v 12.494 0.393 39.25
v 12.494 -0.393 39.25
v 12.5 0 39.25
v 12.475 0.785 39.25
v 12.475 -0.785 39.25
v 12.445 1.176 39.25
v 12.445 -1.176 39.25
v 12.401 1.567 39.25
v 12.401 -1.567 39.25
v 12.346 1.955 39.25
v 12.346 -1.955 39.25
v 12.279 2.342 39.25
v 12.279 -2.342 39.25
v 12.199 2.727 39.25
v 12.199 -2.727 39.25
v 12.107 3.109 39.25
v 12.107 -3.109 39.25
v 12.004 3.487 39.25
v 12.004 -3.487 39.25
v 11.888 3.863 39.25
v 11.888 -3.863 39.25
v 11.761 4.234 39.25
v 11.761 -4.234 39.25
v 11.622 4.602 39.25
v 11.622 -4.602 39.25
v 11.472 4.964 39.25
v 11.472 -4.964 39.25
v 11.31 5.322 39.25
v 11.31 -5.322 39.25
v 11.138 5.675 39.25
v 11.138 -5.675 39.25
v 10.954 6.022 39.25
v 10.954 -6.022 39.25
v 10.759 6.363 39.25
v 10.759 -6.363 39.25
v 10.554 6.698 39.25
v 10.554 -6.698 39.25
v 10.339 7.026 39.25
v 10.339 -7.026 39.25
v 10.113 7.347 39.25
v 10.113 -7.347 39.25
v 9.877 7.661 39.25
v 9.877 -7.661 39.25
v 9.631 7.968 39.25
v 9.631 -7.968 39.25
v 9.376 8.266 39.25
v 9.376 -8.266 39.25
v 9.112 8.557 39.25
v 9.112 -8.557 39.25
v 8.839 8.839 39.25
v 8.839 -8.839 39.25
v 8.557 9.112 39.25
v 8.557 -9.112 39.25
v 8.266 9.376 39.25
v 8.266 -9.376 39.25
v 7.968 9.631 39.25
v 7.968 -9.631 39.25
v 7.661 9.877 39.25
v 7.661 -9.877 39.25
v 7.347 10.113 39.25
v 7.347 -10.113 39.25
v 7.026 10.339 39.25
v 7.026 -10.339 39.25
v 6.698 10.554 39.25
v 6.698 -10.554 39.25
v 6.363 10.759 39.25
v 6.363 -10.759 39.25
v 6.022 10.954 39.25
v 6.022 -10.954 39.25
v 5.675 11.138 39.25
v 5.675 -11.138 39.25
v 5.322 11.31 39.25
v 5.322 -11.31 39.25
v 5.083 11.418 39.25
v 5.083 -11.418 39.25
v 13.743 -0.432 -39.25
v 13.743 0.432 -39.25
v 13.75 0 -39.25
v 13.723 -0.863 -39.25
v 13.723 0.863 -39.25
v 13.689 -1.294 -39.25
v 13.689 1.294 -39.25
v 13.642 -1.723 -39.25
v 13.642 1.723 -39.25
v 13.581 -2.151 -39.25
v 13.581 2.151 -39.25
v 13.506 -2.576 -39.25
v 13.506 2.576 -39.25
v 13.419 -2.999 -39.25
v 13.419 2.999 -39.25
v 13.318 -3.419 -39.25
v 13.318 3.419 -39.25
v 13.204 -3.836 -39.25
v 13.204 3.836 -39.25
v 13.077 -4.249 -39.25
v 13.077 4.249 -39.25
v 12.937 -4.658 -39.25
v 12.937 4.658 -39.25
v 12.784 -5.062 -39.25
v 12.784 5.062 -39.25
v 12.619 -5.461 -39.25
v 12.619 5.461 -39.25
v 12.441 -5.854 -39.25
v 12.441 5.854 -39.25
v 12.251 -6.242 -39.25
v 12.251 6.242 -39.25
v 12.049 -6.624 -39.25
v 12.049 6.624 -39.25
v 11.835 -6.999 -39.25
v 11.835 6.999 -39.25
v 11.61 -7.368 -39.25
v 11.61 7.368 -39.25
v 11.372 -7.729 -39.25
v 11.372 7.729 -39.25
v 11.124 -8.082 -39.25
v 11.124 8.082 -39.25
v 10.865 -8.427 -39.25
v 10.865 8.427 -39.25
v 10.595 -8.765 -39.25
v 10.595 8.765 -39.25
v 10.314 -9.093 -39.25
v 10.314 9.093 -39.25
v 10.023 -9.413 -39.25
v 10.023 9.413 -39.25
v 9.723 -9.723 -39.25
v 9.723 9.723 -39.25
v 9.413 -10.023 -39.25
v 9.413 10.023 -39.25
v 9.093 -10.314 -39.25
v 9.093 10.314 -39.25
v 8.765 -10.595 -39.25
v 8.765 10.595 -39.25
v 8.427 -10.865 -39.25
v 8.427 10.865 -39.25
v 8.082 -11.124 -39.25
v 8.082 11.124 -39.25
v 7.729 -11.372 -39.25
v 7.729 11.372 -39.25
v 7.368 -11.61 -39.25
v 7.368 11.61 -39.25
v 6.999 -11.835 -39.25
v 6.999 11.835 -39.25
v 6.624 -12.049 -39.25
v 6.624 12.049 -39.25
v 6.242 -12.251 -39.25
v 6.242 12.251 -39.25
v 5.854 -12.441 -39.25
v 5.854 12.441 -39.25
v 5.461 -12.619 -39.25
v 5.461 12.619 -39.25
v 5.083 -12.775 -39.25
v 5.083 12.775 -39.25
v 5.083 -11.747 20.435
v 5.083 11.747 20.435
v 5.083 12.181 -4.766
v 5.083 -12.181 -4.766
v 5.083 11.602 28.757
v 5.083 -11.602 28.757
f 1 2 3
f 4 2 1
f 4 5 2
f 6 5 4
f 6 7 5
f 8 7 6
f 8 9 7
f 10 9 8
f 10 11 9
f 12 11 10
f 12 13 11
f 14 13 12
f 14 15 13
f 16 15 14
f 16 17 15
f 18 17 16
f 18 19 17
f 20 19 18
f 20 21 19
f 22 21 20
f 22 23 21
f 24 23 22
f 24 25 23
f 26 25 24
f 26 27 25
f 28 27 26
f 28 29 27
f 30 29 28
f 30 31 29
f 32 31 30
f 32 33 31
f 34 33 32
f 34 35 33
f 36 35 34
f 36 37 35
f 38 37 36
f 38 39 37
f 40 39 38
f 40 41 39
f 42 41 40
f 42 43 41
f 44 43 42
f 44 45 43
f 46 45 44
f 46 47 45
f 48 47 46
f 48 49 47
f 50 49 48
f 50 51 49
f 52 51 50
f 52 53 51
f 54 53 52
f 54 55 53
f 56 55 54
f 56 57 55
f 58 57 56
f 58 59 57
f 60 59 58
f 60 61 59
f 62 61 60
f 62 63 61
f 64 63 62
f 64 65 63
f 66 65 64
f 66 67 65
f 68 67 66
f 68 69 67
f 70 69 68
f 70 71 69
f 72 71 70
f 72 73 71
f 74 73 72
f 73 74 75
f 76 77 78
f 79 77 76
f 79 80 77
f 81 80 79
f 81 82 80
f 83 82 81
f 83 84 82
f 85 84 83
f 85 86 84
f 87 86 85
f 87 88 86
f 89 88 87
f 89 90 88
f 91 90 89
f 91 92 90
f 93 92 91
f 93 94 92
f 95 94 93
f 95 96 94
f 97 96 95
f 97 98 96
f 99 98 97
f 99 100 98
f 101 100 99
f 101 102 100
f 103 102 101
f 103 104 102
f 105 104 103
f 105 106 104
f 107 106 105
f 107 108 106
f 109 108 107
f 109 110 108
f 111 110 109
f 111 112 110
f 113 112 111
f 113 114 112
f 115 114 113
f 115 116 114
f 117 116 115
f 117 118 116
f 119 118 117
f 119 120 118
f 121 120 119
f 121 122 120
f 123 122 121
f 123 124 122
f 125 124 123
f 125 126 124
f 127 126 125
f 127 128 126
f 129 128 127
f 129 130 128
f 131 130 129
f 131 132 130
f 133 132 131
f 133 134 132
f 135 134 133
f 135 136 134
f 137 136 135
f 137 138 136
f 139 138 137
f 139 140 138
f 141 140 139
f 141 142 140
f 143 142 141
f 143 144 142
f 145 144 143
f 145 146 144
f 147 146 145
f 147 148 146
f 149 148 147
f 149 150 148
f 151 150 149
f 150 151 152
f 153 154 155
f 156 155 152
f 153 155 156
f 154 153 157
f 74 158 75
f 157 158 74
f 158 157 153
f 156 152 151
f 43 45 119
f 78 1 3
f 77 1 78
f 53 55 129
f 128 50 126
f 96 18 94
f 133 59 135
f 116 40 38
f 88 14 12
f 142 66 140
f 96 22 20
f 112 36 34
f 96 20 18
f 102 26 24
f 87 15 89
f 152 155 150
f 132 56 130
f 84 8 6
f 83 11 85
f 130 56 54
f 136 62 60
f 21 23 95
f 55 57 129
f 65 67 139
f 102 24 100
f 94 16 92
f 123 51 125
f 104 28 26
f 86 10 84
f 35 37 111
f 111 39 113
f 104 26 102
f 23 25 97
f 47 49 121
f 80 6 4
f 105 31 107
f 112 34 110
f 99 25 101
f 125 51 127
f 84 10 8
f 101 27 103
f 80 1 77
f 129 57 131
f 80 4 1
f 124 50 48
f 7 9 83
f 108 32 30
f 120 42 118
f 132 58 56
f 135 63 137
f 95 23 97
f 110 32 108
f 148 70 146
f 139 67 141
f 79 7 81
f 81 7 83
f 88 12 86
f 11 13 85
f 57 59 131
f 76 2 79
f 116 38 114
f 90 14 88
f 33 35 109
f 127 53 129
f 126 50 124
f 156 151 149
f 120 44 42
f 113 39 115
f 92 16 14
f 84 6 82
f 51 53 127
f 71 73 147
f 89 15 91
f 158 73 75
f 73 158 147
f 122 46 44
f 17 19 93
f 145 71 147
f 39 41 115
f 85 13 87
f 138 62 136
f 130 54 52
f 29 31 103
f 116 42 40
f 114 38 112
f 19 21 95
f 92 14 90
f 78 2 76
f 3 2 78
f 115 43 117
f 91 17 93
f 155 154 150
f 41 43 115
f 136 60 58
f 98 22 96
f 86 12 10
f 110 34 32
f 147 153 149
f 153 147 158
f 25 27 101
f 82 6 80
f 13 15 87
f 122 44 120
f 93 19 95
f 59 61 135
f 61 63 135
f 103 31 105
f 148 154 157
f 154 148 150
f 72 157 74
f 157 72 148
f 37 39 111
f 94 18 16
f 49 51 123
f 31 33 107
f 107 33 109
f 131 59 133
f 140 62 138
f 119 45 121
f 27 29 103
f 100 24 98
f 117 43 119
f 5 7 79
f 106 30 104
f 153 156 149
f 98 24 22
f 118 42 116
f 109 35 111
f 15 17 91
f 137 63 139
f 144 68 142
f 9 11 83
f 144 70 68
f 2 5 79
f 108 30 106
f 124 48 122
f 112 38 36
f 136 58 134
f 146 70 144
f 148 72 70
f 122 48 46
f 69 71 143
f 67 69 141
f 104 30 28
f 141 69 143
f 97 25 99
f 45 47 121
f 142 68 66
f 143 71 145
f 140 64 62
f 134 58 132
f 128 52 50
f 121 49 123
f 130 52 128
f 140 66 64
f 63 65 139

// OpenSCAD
outer_d1 = 30;
outer_d2 = 27.5;
inner_d1 = outer_d1 - 2.5;
inner_d2 = outer_d2 - 2.5;
chamber_length = 97.5;
magnet_size = [6.2,3]; // diameter, height

$fn = $preview ? 60 : 200;

// tube_plug(
//     hose_on_side = false, 
//     inner_d = inner_d1, 
//     outer_d = outer_d1, 
//     magnet_size = magnet_size
//     );

tube_floor(
    chamber_length = chamber_length,
    inner_d1 = inner_d1,
    inner_d2 = inner_d2
    );

module tube_plug(
    hose_on_side=false,
    inner_d,
    outer_d,
    o_ring_d,
    magnet_size
){
    h = 10.2;
    h_inner = 10;
    air_duct_d = 3;
    hose_connector_inner_d = 9.8;
    inner_d = inner_d - 1;
    
    difference(){
        union(){
            difference(){
                union(){
                    cylinder(h=h, d=outer_d);
                    
                    // Remove space for floor
                    translate([0,0,h])
                    intersection(){
                        translate([1/3*inner_d,0,0])
                        cube(inner_d, center=true);
                        cylinder(h=h_inner, d=inner_d);
                    }

                    // cylinder(h=h+h_inner, d=inner_d);
                    // #difference(){
                    //     cylinder(h=h+h_inner/2, d=outer_d+3);
                    //     cylinder(h=h+h_inner/2, d=outer_d);
                    // }
                }
                
                if (hose_on_side==true){
                    // Magnets
                    for (i=[-1,1]){
                        translate([i*0.3*outer_d,0,0])
                        cylinder(h=magnet_size[1], d=magnet_size[0]);
                    }

                    // Airhole
                    translate([0,0,h/2])
                    cylinder(h=h,d=air_duct_d);
                    
                    translate([0,0,h/2])
                    rotate([90,0,0])
                    cylinder(h=outer_d,d=air_duct_d);
                    
                    translate([0,-outer_d/2+10,h/2]){
                        rotate([90,0,0]){
                            cylinder(h=outer_d,d=hose_connector_inner_d);
                            translate([0,0,8])
                            cylinder(h=outer_d,d=hose_connector_inner_d+7);
                        }
                    }
                } else {
                    // Airhole
                    cylinder(h=h+h_inner,d=air_duct_d);
                    cylinder(h=10, d=hose_connector_inner_d);

                    // Innder funnel
                    translate([0,0,h+2])
                    cylinder(d1=air_duct_d, d2=inner_d-2, h=h_inner-2);

                    // Magnet
                    rotate([0,90,0])
                    translate([-h/2,0,-outer_d/2])
                    cylinder(d=magnet_size[0], h=magnet_size[1]);   
                }
            }

            // Mini floor + attachment points
            translate([0,0,h]){
                // Floor
                difference(){
                    intersection(){
                        translate([-2/3*inner_d,0,-0.5])
                        cube(inner_d, center=true);
                        cylinder(h=h_inner-0.5, d=inner_d);
                    }
                }
                

                // Attachment points
                for (i=[-90,0,90]){
                    rotate([0,0,i])
                    translate([1/2*inner_d-2.5,0,0])
                    cylinder(h=h_inner+1, d=5);
                }
                

            }

            // Fence !!! In slicing, cut into separate object 
            translate([0,0,h+h_inner])
            intersection(){
                translate([1/3*inner_d+0.2,0,0])
                cube(inner_d, center=true);
                cylinder(d=inner_d, h=2);
            }
        }

        translate([0,0,h+(h_inner/2)])
        rotate_extrude(){
            translate([(inner_d+1)/2-1,0,0])
            circle(d=o_ring_d);
        }
    }
    
}

module tube_floor(
    chamber_length,
    inner_d1,
    inner_d2,
    pegs=false
){
    chamber_length = chamber_length - 2*9.5;
    peg_d = 2.5;
    peg_h = 2;

    translate([0,0,-chamber_length/2])
    intersection(){
        #translate([2/3*inner_d1+1.5,0,chamber_length/2])
        cube([inner_d1+2, inner_d1+2, chamber_length], center=true);
        cylinder(d1=inner_d1, d2 = inner_d2, h=chamber_length);
    }
    if (pegs==true){
        for (i=[-1,1]){
            for (j=[-1,1]){
                translate([1/3.5*inner_d1,i*0.2*inner_d1,j*chamber_length/2+j/2])
                cylinder(d=peg_d, h=peg_h, center=true);
            }
        }
    }
}
